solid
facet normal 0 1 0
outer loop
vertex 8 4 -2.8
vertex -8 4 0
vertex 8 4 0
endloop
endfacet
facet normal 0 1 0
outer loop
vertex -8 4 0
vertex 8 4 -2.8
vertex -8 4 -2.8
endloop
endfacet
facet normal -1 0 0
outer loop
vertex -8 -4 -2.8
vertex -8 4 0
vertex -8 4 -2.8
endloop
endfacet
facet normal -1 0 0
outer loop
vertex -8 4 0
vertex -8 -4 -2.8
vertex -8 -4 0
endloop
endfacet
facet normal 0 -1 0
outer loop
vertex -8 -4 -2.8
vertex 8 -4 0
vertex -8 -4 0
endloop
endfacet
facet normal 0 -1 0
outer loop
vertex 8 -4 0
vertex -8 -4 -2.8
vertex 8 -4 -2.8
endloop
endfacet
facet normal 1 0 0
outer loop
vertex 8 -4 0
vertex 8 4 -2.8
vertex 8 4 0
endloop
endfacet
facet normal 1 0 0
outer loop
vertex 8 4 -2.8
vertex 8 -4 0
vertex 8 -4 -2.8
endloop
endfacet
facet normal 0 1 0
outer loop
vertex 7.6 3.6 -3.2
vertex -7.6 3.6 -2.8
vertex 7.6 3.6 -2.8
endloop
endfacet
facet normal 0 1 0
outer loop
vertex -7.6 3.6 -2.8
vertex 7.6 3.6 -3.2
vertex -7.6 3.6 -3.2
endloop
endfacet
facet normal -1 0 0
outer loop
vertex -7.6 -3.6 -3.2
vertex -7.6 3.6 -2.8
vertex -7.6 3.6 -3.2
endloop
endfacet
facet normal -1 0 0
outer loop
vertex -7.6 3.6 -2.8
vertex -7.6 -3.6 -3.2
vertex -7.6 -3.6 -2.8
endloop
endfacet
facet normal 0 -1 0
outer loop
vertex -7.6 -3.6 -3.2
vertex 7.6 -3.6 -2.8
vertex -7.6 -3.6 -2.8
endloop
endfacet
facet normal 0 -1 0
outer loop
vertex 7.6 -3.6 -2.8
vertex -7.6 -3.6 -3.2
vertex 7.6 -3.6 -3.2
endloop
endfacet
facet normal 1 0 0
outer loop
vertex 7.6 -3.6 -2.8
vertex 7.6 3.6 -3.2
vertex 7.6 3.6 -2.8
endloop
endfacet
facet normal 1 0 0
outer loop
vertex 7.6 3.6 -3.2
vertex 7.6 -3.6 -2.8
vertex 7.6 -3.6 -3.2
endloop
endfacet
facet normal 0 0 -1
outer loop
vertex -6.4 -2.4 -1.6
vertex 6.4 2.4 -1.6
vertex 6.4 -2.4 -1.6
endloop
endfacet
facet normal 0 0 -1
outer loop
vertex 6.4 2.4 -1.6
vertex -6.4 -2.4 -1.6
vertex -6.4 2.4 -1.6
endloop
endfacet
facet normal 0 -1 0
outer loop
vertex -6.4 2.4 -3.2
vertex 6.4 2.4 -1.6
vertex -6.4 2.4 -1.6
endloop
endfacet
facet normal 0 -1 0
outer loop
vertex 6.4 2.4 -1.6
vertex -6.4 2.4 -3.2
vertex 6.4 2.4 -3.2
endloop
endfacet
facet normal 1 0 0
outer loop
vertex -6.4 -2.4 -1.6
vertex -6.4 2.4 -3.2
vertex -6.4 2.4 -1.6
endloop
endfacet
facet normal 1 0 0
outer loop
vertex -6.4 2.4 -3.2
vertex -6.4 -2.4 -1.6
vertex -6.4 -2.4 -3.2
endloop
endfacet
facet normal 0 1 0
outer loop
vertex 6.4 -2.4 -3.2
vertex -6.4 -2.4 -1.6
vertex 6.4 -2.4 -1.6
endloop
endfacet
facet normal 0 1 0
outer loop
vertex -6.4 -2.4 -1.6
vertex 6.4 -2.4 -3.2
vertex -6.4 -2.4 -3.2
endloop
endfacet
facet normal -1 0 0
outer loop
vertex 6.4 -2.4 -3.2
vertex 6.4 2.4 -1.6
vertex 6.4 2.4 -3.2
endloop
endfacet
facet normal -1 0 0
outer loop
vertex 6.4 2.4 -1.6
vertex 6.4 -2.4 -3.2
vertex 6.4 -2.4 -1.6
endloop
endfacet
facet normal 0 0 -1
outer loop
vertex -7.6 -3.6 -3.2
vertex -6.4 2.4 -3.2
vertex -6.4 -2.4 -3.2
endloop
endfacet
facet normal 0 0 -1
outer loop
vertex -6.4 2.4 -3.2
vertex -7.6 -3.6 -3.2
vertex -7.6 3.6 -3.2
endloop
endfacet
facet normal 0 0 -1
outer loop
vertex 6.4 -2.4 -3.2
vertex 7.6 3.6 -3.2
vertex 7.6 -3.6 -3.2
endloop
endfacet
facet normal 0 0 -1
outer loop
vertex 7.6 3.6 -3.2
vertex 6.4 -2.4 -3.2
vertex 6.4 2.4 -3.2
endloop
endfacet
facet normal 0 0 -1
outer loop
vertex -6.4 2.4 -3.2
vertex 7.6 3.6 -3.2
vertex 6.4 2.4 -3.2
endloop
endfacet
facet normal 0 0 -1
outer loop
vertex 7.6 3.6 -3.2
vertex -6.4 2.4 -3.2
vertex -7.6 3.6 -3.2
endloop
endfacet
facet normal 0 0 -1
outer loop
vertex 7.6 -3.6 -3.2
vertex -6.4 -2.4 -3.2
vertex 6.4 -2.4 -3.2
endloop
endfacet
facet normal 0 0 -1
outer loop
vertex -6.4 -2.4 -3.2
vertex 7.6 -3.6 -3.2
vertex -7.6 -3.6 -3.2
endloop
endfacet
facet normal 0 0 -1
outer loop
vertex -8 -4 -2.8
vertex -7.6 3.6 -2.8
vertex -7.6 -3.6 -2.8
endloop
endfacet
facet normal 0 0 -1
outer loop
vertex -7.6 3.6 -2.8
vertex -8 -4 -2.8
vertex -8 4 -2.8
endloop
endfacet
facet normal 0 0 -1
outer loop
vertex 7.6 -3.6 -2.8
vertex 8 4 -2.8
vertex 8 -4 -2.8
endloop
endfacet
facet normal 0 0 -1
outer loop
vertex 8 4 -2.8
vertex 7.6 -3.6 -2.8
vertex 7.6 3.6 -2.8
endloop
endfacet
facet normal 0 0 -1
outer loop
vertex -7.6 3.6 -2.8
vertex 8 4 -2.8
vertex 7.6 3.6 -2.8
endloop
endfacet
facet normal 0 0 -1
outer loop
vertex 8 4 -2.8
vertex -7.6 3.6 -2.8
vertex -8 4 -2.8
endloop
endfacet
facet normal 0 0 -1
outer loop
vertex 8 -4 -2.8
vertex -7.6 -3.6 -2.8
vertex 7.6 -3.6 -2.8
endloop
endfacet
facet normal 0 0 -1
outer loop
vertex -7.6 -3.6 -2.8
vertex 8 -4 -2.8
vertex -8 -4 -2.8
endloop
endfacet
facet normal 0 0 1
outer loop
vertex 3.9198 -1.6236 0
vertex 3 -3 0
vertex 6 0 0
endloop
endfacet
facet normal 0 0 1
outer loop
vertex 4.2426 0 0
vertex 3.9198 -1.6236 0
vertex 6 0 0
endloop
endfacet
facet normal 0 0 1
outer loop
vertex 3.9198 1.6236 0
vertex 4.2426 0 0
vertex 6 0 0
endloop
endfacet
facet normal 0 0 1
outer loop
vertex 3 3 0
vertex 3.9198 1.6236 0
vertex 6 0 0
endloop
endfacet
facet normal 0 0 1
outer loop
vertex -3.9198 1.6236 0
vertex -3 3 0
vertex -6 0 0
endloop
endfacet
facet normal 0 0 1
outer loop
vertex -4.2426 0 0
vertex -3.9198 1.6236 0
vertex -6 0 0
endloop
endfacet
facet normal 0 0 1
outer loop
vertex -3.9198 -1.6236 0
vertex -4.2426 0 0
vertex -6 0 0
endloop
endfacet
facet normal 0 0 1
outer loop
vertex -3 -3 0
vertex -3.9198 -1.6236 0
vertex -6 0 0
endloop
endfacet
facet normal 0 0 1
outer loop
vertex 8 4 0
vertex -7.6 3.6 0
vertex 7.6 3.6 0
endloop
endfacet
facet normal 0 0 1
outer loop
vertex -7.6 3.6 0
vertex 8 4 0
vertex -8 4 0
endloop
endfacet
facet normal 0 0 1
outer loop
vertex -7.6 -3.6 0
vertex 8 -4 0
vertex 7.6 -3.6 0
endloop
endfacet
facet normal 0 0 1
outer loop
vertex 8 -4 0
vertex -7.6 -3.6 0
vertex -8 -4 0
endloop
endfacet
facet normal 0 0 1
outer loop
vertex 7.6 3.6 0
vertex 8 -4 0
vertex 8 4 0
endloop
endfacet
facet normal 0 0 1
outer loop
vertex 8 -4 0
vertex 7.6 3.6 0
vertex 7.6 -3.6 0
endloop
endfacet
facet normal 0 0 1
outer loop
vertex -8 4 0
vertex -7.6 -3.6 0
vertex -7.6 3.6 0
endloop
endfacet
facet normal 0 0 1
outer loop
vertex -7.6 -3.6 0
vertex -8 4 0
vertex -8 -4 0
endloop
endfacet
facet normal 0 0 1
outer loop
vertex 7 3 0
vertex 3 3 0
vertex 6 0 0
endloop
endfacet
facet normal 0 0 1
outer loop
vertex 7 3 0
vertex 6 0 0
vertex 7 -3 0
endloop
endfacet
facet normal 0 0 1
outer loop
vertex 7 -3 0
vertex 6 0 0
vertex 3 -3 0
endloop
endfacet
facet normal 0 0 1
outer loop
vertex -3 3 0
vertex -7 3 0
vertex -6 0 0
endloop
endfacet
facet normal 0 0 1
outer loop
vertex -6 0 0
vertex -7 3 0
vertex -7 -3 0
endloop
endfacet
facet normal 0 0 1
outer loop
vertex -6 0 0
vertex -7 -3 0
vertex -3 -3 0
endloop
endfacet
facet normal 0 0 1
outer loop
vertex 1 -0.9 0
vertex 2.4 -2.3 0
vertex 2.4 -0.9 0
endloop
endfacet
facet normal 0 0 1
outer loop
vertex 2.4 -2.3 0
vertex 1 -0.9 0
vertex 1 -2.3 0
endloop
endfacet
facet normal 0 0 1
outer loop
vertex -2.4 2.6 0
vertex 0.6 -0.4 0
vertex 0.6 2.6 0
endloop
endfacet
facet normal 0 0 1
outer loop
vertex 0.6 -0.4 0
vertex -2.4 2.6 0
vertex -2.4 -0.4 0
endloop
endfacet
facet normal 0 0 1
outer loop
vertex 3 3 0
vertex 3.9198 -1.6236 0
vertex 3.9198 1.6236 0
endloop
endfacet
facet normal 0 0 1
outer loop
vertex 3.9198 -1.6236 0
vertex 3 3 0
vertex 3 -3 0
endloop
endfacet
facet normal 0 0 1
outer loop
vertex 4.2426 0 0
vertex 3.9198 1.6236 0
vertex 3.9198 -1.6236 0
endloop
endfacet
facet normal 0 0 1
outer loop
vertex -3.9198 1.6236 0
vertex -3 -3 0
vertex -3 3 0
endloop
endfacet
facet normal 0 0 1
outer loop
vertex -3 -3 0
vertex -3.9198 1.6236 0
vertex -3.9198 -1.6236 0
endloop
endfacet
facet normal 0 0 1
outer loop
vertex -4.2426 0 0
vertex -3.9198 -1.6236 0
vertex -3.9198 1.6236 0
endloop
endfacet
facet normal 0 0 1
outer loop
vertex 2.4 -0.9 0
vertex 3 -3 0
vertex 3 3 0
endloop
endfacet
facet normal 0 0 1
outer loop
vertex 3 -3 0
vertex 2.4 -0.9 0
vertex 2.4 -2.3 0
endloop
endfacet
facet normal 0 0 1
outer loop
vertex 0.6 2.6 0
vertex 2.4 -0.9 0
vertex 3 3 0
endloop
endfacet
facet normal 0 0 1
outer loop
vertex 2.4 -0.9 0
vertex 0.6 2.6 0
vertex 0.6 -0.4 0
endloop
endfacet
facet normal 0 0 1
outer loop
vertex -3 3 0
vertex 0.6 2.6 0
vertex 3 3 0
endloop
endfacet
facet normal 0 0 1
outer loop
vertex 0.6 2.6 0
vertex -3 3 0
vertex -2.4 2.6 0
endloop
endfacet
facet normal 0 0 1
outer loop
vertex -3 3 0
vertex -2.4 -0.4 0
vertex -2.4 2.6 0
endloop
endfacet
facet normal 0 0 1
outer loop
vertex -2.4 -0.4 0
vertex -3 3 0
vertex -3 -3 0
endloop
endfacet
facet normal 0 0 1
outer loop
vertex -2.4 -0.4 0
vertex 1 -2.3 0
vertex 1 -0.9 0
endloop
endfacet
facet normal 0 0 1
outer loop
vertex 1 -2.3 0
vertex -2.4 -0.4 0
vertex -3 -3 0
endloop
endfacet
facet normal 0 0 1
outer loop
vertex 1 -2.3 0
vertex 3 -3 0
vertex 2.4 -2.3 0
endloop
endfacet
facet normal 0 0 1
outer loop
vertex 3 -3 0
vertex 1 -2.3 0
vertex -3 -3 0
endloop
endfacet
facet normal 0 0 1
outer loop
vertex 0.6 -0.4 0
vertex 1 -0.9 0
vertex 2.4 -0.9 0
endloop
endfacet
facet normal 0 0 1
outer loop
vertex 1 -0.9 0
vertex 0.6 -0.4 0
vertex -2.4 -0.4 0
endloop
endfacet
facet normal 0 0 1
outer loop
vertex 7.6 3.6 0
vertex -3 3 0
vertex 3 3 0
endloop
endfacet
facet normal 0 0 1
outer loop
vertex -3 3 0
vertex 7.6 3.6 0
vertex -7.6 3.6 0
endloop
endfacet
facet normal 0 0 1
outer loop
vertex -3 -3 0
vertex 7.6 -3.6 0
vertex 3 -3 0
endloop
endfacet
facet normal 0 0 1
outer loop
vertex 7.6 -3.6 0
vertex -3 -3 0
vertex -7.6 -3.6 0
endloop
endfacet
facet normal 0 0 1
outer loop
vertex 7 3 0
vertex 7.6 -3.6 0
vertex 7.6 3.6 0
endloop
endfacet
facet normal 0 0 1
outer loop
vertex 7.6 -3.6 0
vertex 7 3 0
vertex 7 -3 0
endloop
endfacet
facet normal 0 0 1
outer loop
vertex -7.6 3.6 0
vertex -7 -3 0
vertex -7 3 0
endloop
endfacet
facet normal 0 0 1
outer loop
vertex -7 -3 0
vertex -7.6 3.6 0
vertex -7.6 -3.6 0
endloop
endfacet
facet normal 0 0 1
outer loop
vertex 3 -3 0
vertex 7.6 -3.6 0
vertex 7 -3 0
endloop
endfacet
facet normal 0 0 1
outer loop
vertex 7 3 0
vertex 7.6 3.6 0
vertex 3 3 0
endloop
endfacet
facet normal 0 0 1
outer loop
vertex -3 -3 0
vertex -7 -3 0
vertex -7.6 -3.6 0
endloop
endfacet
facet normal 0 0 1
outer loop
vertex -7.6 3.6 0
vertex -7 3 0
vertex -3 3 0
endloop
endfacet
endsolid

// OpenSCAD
// file: ../p/box5.scad
use <../lib.scad>
function ldraw_lib__box5() = [
// 0 Box with 5 Faces and All Edges
// 0 Name: box5.dat
// 0 Author: James Jessiman
// 0 !LDRAW_ORG Primitive UPDATE 2012-01
// 0 !LICENSE Licensed under CC BY 2.0 and CC BY 4.0 : see CAreadme.txt
// 
// 0 BFC CERTIFY CCW
  [0,"BFC","CERTIFY"],
  [0,"BFC","CCW"],
// 
// 0 !HISTORY 2002-04-03 [sbliss] Modified for BFC compliance
// 0 !HISTORY 2002-04-25 [PTadmin] Official Update 2002-02
// 0 !HISTORY 2007-06-24 [PTadmin] Header formatted for Contributor Agreement
// 0 !HISTORY 2008-07-01 [PTadmin] Official Update 2008-01
// 0 !HISTORY 2012-02-16 [Philo] Changed to CCW
// 0 !HISTORY 2012-03-30 [PTadmin] Official Update 2012-01
// 
// 
// 2 24 1 1 1 -1 1 1
  [2,24,1,1,1,-1,1,1],
// 2 24 -1 1 1 -1 1 -1
  [2,24,-1,1,1,-1,1,-1],
// 2 24 -1 1 -1 1 1 -1
  [2,24,-1,1,-1,1,1,-1],
// 2 24 1 1 -1 1 1 1
  [2,24,1,1,-1,1,1,1],
// 2 24 1 0 1 -1 0 1
  [2,24,1,0,1,-1,0,1],
// 2 24 -1 0 1 -1 0 -1
  [2,24,-1,0,1,-1,0,-1],
// 2 24 -1 0 -1 1 0 -1
  [2,24,-1,0,-1,1,0,-1],
// 2 24 1 0 -1 1 0 1
  [2,24,1,0,-1,1,0,1],
// 2 24 1 0 1 1 1 1
  [2,24,1,0,1,1,1,1],
// 2 24 -1 0 1 -1 1 1
  [2,24,-1,0,1,-1,1,1],
// 2 24 1 0 -1 1 1 -1
  [2,24,1,0,-1,1,1,-1],
// 2 24 -1 0 -1 -1 1 -1
  [2,24,-1,0,-1,-1,1,-1],
// 4 16 -1 1 1 1 1 1 1 1 -1 -1 1 -1
  [4,16,-1,1,1,1,1,1,1,1,-1,-1,1,-1],
// 4 16 -1 1 1 -1 0 1 1 0 1 1 1 1
  [4,16,-1,1,1,-1,0,1,1,0,1,1,1,1],
// 4 16 -1 1 -1 -1 0 -1 -1 0 1 -1 1 1
  [4,16,-1,1,-1,-1,0,-1,-1,0,1,-1,1,1],
// 4 16 1 1 -1 1 0 -1 -1 0 -1 -1 1 -1
  [4,16,1,1,-1,1,0,-1,-1,0,-1,-1,1,-1],
// 4 16 1 1 1 1 0 1 1 0 -1 1 1 -1
  [4,16,1,1,1,1,0,1,1,0,-1,1,1,-1],
];
makepoly(ldraw_lib__box5(), line=0.2);
// file: ../p/box4.scad
use <../lib.scad>
function ldraw_lib__box4() = [
// 0 Box with 4 Faces (2 Parallel Pairs) and All Edges
// 0 Name: box4.dat
// 0 Author: James Jessiman
// 0 !LDRAW_ORG Primitive UPDATE 2012-01
// 0 !LICENSE Licensed under CC BY 2.0 and CC BY 4.0 : see CAreadme.txt
// 
// 0 BFC CERTIFY CCW
  [0,"BFC","CERTIFY"],
  [0,"BFC","CCW"],
// 
// 0 !HISTORY 2002-04-03 [sbliss] Modified for BFC compliance
// 0 !HISTORY 2002-04-25 [PTadmin] Official Update 2002-02
// 0 !HISTORY 2007-06-24 [PTadmin] Header formatted for Contributor Agreement
// 0 !HISTORY 2008-07-01 [PTadmin] Official Update 2008-01
// 0 !HISTORY 2012-02-16 [Philo] Changed to CCW
// 0 !HISTORY 2012-03-30 [PTadmin] Official Update 2012-01
// 
// 
// 2 24 1 1 1 -1 1 1
  [2,24,1,1,1,-1,1,1],
// 2 24 -1 1 1 -1 1 -1
  [2,24,-1,1,1,-1,1,-1],
// 2 24 -1 1 -1 1 1 -1
  [2,24,-1,1,-1,1,1,-1],
// 2 24 1 1 -1 1 1 1
  [2,24,1,1,-1,1,1,1],
// 2 24 1 0 1 -1 0 1
  [2,24,1,0,1,-1,0,1],
// 2 24 -1 0 1 -1 0 -1
  [2,24,-1,0,1,-1,0,-1],
// 2 24 -1 0 -1 1 0 -1
  [2,24,-1,0,-1,1,0,-1],
// 2 24 1 0 -1 1 0 1
  [2,24,1,0,-1,1,0,1],
// 2 24 1 0 1 1 1 1
  [2,24,1,0,1,1,1,1],
// 2 24 -1 0 1 -1 1 1
  [2,24,-1,0,1,-1,1,1],
// 2 24 1 0 -1 1 1 -1
  [2,24,1,0,-1,1,1,-1],
// 2 24 -1 0 -1 -1 1 -1
  [2,24,-1,0,-1,-1,1,-1],
// 4 16 -1 1 1 -1 0 1 1 0 1 1 1 1
  [4,16,-1,1,1,-1,0,1,1,0,1,1,1,1],
// 4 16 -1 1 -1 -1 0 -1 -1 0 1 -1 1 1
  [4,16,-1,1,-1,-1,0,-1,-1,0,1,-1,1,1],
// 4 16 1 1 -1 1 0 -1 -1 0 -1 -1 1 -1
  [4,16,1,1,-1,1,0,-1,-1,0,-1,-1,1,-1],
// 4 16 1 1 1 1 0 1 1 0 -1 1 1 -1
  [4,16,1,1,1,1,0,1,1,0,-1,1,1,-1],
];
makepoly(ldraw_lib__box4(), line=0.2);
// file: s/3069bs01.scad
use <../../lib.scad>
use <../../p/box4.scad>
use <../../p/box5.scad>
function ldraw_lib__s__3069bs01() = [
// 0 ~Tile  1 x  2 with Groove without Top Face
// 0 Name: s\3069bs01.dat
// 0 Author: Santeri Piippo [arezey]
// 0 !LDRAW_ORG Subpart UPDATE 2010-02
// 0 !LICENSE Licensed under CC BY 2.0 and CC BY 4.0 : see CAreadme.txt
// 
// 0 BFC CERTIFY CCW
  [0,"BFC","CERTIFY"],
  [0,"BFC","CCW"],
// 
// 0 !HISTORY 2010-07-05 [PTadmin] Official Update 2010-02
// 
// 
// 1 16 0 0 0 20 0 0 0 7 0 0 0 10 box4.dat
  [1,16,0,0,0,20,0,0,0,7,0,0,0,10, ldraw_lib__box4()],
// 1 16 0 7 0 19 0 0 0 1 0 0 0 9 box4.dat
  [1,16,0,7,0,19,0,0,0,1,0,0,0,9, ldraw_lib__box4()],
// 0 BFC INVERTNEXT
  [0,"BFC","INVERTNEXT"],
// 1 16 0 8 0 16 0 0 0 -4 0 0 0 6 box5.dat
  [1,16,0,8,0,16,0,0,0,-4,0,0,0,6, ldraw_lib__box5()],
// 4 16 -19 8 9 -16 8 6 -16 8 -6 -19 8 -9
  [4,16,-19,8,9,-16,8,6,-16,8,-6,-19,8,-9],
// 4 16 19 8 -9 16 8 -6 16 8 6 19 8 9
  [4,16,19,8,-9,16,8,-6,16,8,6,19,8,9],
// 4 16 19 8 9 16 8 6 -16 8 6 -19 8 9
  [4,16,19,8,9,16,8,6,-16,8,6,-19,8,9],
// 4 16 -19 8 -9 -16 8 -6 16 8 -6 19 8 -9
  [4,16,-19,8,-9,-16,8,-6,16,8,-6,19,8,-9],
// 4 16 -20 7 10 -19 7 9 -19 7 -9 -20 7 -10
  [4,16,-20,7,10,-19,7,9,-19,7,-9,-20,7,-10],
// 4 16 20 7 -10 19 7 -9 19 7 9 20 7 10
  [4,16,20,7,-10,19,7,-9,19,7,9,20,7,10],
// 4 16 20 7 10 19 7 9 -19 7 9 -20 7 10
  [4,16,20,7,10,19,7,9,-19,7,9,-20,7,10],
// 4 16 -20 7 -10 -19 7 -9 19 7 -9 20 7 -10
  [4,16,-20,7,-10,-19,7,-9,19,7,-9,20,7,-10],
// 0 //
];
makepoly(ldraw_lib__s__3069bs01(), line=0.2);
// file: ../p/1-4ndis.scad
use <../lib.scad>
function ldraw_lib__1_4ndis() = [
// 0 Disc Negative 0.25
// 0 Name: 1-4ndis.dat
// 0 Author: James Jessiman
// 0 !LDRAW_ORG Primitive UPDATE 2012-01
// 0 !LICENSE Licensed under CC BY 2.0 and CC BY 4.0 : see CAreadme.txt
// 
// 0 BFC CERTIFY CCW
  [0,"BFC","CERTIFY"],
  [0,"BFC","CCW"],
// 
// 0 !HISTORY 2002-03-23 [sbliss] Added BFC Statement
// 0 !HISTORY 2002-04-25 [PTadmin] Official Update 2002-02
// 0 !HISTORY 2007-06-22 [PTadmin] Header formatted for Contributor Agreement
// 0 !HISTORY 2008-07-01 [PTadmin] Official Update 2008-01
// 0 !HISTORY 2012-02-16 [Philo] Changed to CCW
// 0 !HISTORY 2012-03-30 [PTadmin] Official Update 2012-01
// 
// 
// 3 16 0.9239 0 0.3827 1 0 0 1 0 1
  [3,16,0.9239,0,0.3827,1,0,0,1,0,1],
// 3 16 0.7071 0 0.7071 0.9239 0 0.3827 1 0 1
  [3,16,0.7071,0,0.7071,0.9239,0,0.3827,1,0,1],
// 3 16 0.3827 0 0.9239 0.7071 0 0.7071 1 0 1
  [3,16,0.3827,0,0.9239,0.7071,0,0.7071,1,0,1],
// 3 16 0 0 1 0.3827 0 0.9239 1 0 1
  [3,16,0,0,1,0.3827,0,0.9239,1,0,1],
];
makepoly(ldraw_lib__1_4ndis(), line=0.2);
// file: ../p/1-4chrd.scad
use <../lib.scad>
function ldraw_lib__1_4chrd() = [
// 0 Chord 0.25
// 0 Name: 1-4chrd.dat
// 0 Author: Tony Hafner [hafhead]
// 0 !LDRAW_ORG Primitive UPDATE 2012-02
// 0 !LICENSE Licensed under CC BY 2.0 and CC BY 4.0 : see CAreadme.txt
// 
// 0 BFC CERTIFY CCW
  [0,"BFC","CERTIFY"],
  [0,"BFC","CCW"],
// 
// 0 !HISTORY 2004-04-22 [PTadmin] Official Update 2004-02
// 0 !HISTORY 2007-10-09 [PTadmin] Header formatted for Contributor Agreement
// 0 !HISTORY 2008-07-01 [PTadmin] Official Update 2008-01
// 0 !HISTORY 2012-08-02 [MMR1988] Re-creation with PrimGen2 and Rectifier
// 0 !HISTORY 2012-08-09 [PTadmin] Official Update 2012-02
// 
// 
// 4 16 0.9239 0 0.3827 0.3827 0 0.9239 0 0 1 1 0 0
  [4,16,0.9239,0,0.3827,0.3827,0,0.9239,0,0,1,1,0,0],
// 3 16 0.7071 0 0.7071 0.3827 0 0.9239 0.9239 0 0.3827
  [3,16,0.7071,0,0.7071,0.3827,0,0.9239,0.9239,0,0.3827],
];
makepoly(ldraw_lib__1_4chrd(), line=0.2);
// main file
use <../lib.scad>
use <../p/1-4chrd.scad>
use <../p/1-4ndis.scad>
use <s/3069bs01.scad>
function ldraw_lib__3069bpz4() = [
// 0 Tile  1 x  2 with  2 White Squares on Black Background and Gold Rectangle Pattern
// 0 Name: 3069bpz4.dat
// 0 Author: Ulrich Röder [UR]
// 0 !LDRAW_ORG Part UPDATE 2020-01
// 0 !LICENSE Licensed under CC BY 2.0 and CC BY 4.0 : see CAreadme.txt
// 
// 0 BFC CERTIFY CCW
  [0,"BFC","CERTIFY"],
  [0,"BFC","CCW"],
// 
// 0 !KEYWORDS Brickheadz, Bricklink 3069bpb658, Set 41621
// 
// 0 !CMDLINE -c47
// 
// 0 !HISTORY 2020-06-28 [PTadmin] Official Update 2020-01
// 
// 
// 0 // Main
// 1 16 0 0 0 1 0 0 0 1 0 0 0 1 s\3069bs01.dat
  [1,16,0,0,0,1,0,0,0,1,0,0,0,1, ldraw_lib__s__3069bs01()],
// 1 16 0 0 0 7.5 0 7.5 0 1 0 -7.5 0 7.5 1-4ndis.dat
  [1,16,0,0,0,7.5,0,7.5,0,1,0,-7.5,0,7.5, ldraw_lib__1_4ndis()],
// 1 16 0 0 0 -7.5 0 -7.5 0 1 0 7.5 0 -7.5 1-4ndis.dat
  [1,16,0,0,0,-7.5,0,-7.5,0,1,0,7.5,0,-7.5, ldraw_lib__1_4ndis()],
// 4 16 -20 0 10 -19 0 9 19 0 9 20 0 10
  [4,16,-20,0,10,-19,0,9,19,0,9,20,0,10],
// 4 16 20 0 -10 19 0 -9 -19 0 -9 -20 0 -10
  [4,16,20,0,-10,19,0,-9,-19,0,-9,-20,0,-10],
// 4 16 20 0 10 19 0 9 19 0 -9 20 0 -10
  [4,16,20,0,10,19,0,9,19,0,-9,20,0,-10],
// 4 16 -20 0 -10 -19 0 -9 -19 0 9 -20 0 10
  [4,16,-20,0,-10,-19,0,-9,-19,0,9,-20,0,10],
// 3 16 17.5 0 7.5 7.5 0 7.5 15 0 0
  [3,16,17.5,0,7.5,7.5,0,7.5,15,0,0],
// 3 16 17.5 0 7.5 15 0 0 17.5 0 -7.5
  [3,16,17.5,0,7.5,15,0,0,17.5,0,-7.5],
// 3 16 17.5 0 -7.5 15 0 0 7.5 0 -7.5
  [3,16,17.5,0,-7.5,15,0,0,7.5,0,-7.5],
// 3 16 -7.5 0 7.5 -17.5 0 7.5 -15 0 0
  [3,16,-7.5,0,7.5,-17.5,0,7.5,-15,0,0],
// 3 16 -15 0 0 -17.5 0 7.5 -17.5 0 -7.5
  [3,16,-15,0,0,-17.5,0,7.5,-17.5,0,-7.5],
// 3 16 -15 0 0 -17.5 0 -7.5 -7.5 0 -7.5
  [3,16,-15,0,0,-17.5,0,-7.5,-7.5,0,-7.5],
// 
// 0 BFC NOCLIP
  [0,"BFC","NOCLIP"],
// 
// 0 // White
// 4 15 6 0 -5.75 6 0 -2.25 2.5 0 -2.25 2.5 0 -5.75
  [4,15,6,0,-5.75,6,0,-2.25,2.5,0,-2.25,2.5,0,-5.75],
// 4 15 -6 0 -1 1.5 0 -1 1.5 0 6.5 -6 0 6.5
  [4,15,-6,0,-1,1.5,0,-1,1.5,0,6.5,-6,0,6.5],
// 
// 0 // Black
// 1 0 0 0 0 7.5 0 7.5 0 1 0 -7.5 0 7.5 1-4chrd.dat
  [1,0,0,0,0,7.5,0,7.5,0,1,0,-7.5,0,7.5, ldraw_lib__1_4chrd()],
// 1 0 0 0 0 -7.5 0 -7.5 0 1 0 7.5 0 -7.5 1-4chrd.dat
  [1,0,0,0,0,-7.5,0,-7.5,0,1,0,7.5,0,-7.5, ldraw_lib__1_4chrd()],
// 4 0 6 0 -2.25 6 0 -5.75 7.5 0 -7.5 7.5 0 7.5
  [4,0,6,0,-2.25,6,0,-5.75,7.5,0,-7.5,7.5,0,7.5],
// 4 0 6 0 -2.25 7.5 0 7.5 1.5 0 6.5 1.5 0 -1
  [4,0,6,0,-2.25,7.5,0,7.5,1.5,0,6.5,1.5,0,-1],
// 4 0 -7.5 0 7.5 -6 0 6.5 1.5 0 6.5 7.5 0 7.5
  [4,0,-7.5,0,7.5,-6,0,6.5,1.5,0,6.5,7.5,0,7.5],
// 4 0 -6 0 -1 -6 0 6.5 -7.5 0 7.5 -7.5 0 -7.5
  [4,0,-6,0,-1,-6,0,6.5,-7.5,0,7.5,-7.5,0,-7.5],
// 4 0 2.5 0 -2.25 -6 0 -1 -7.5 0 -7.5 2.5 0 -5.75
  [4,0,2.5,0,-2.25,-6,0,-1,-7.5,0,-7.5,2.5,0,-5.75],
// 4 0 6 0 -5.75 2.5 0 -5.75 -7.5 0 -7.5 7.5 0 -7.5
  [4,0,6,0,-5.75,2.5,0,-5.75,-7.5,0,-7.5,7.5,0,-7.5],
// 4 0 -6 0 -1 2.5 0 -2.25 6 0 -2.25 1.5 0 -1
  [4,0,-6,0,-1,2.5,0,-2.25,6,0,-2.25,1.5,0,-1],
// 
// 0 // Metallic Gold
// 4 82 -7.5 0 7.5 7.5 0 7.5 19 0 9 -19 0 9
  [4,82,-7.5,0,7.5,7.5,0,7.5,19,0,9,-19,0,9],
// 4 82 7.5 0 -7.5 -7.5 0 -7.5 -19 0 -9 19 0 -9
  [4,82,7.5,0,-7.5,-7.5,0,-7.5,-19,0,-9,19,0,-9],
// 4 82 17.5 0 7.5 17.5 0 -7.5 19 0 -9 19 0 9
  [4,82,17.5,0,7.5,17.5,0,-7.5,19,0,-9,19,0,9],
// 4 82 -17.5 0 -7.5 -17.5 0 7.5 -19 0 9 -19 0 -9
  [4,82,-17.5,0,-7.5,-17.5,0,7.5,-19,0,9,-19,0,-9],
// 3 82 7.5 0 -7.5 19 0 -9 17.5 0 -7.5
  [3,82,7.5,0,-7.5,19,0,-9,17.5,0,-7.5],
// 3 82 17.5 0 7.5 19 0 9 7.5 0 7.5
  [3,82,17.5,0,7.5,19,0,9,7.5,0,7.5],
// 3 82 -7.5 0 -7.5 -17.5 0 -7.5 -19 0 -9
  [3,82,-7.5,0,-7.5,-17.5,0,-7.5,-19,0,-9],
// 3 82 -19 0 9 -17.5 0 7.5 -7.5 0 7.5
  [3,82,-19,0,9,-17.5,0,7.5,-7.5,0,7.5],
];
makepoly(ldraw_lib__3069bpz4(), line=0.2);
